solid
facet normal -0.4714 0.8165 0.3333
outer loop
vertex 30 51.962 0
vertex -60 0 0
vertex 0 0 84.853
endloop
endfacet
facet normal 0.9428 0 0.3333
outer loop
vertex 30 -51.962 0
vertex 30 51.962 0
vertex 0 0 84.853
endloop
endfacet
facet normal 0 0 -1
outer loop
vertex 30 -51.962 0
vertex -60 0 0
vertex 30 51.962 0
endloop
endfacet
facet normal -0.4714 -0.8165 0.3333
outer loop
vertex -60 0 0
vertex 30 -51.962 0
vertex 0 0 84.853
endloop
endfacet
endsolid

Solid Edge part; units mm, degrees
sketch "Sketch1" plane through (0, 0, 0) normal (0, 0, 1) x (1, 0, 0)
  line L0 (-60, 0) -> (30, -51.9615)
  line L1 (30, -51.9615) -> (30, 51.9615)
  line L2 (30, 51.9615) -> (-60, 0)
extrude "Protrusion1" add sketch "Sketch1" along normal up to vertex (84.8528 mm away)
sketch "Sketch2" plane through (0, 0, 0) normal (0, -1, 0) x (1, 0, 0)
  line L0 (0, 84.8528) -> (30, 0)
extrude "Cutout1" cut sketch "Sketch2" along normal mid plane 103.923 material side at (15.0471, 0, 42.4431)
pattern_circular "Pattern1" count 3 over 360 about axis through (0, 0, 0) along (0, 0, -1) of "Cutout1"
